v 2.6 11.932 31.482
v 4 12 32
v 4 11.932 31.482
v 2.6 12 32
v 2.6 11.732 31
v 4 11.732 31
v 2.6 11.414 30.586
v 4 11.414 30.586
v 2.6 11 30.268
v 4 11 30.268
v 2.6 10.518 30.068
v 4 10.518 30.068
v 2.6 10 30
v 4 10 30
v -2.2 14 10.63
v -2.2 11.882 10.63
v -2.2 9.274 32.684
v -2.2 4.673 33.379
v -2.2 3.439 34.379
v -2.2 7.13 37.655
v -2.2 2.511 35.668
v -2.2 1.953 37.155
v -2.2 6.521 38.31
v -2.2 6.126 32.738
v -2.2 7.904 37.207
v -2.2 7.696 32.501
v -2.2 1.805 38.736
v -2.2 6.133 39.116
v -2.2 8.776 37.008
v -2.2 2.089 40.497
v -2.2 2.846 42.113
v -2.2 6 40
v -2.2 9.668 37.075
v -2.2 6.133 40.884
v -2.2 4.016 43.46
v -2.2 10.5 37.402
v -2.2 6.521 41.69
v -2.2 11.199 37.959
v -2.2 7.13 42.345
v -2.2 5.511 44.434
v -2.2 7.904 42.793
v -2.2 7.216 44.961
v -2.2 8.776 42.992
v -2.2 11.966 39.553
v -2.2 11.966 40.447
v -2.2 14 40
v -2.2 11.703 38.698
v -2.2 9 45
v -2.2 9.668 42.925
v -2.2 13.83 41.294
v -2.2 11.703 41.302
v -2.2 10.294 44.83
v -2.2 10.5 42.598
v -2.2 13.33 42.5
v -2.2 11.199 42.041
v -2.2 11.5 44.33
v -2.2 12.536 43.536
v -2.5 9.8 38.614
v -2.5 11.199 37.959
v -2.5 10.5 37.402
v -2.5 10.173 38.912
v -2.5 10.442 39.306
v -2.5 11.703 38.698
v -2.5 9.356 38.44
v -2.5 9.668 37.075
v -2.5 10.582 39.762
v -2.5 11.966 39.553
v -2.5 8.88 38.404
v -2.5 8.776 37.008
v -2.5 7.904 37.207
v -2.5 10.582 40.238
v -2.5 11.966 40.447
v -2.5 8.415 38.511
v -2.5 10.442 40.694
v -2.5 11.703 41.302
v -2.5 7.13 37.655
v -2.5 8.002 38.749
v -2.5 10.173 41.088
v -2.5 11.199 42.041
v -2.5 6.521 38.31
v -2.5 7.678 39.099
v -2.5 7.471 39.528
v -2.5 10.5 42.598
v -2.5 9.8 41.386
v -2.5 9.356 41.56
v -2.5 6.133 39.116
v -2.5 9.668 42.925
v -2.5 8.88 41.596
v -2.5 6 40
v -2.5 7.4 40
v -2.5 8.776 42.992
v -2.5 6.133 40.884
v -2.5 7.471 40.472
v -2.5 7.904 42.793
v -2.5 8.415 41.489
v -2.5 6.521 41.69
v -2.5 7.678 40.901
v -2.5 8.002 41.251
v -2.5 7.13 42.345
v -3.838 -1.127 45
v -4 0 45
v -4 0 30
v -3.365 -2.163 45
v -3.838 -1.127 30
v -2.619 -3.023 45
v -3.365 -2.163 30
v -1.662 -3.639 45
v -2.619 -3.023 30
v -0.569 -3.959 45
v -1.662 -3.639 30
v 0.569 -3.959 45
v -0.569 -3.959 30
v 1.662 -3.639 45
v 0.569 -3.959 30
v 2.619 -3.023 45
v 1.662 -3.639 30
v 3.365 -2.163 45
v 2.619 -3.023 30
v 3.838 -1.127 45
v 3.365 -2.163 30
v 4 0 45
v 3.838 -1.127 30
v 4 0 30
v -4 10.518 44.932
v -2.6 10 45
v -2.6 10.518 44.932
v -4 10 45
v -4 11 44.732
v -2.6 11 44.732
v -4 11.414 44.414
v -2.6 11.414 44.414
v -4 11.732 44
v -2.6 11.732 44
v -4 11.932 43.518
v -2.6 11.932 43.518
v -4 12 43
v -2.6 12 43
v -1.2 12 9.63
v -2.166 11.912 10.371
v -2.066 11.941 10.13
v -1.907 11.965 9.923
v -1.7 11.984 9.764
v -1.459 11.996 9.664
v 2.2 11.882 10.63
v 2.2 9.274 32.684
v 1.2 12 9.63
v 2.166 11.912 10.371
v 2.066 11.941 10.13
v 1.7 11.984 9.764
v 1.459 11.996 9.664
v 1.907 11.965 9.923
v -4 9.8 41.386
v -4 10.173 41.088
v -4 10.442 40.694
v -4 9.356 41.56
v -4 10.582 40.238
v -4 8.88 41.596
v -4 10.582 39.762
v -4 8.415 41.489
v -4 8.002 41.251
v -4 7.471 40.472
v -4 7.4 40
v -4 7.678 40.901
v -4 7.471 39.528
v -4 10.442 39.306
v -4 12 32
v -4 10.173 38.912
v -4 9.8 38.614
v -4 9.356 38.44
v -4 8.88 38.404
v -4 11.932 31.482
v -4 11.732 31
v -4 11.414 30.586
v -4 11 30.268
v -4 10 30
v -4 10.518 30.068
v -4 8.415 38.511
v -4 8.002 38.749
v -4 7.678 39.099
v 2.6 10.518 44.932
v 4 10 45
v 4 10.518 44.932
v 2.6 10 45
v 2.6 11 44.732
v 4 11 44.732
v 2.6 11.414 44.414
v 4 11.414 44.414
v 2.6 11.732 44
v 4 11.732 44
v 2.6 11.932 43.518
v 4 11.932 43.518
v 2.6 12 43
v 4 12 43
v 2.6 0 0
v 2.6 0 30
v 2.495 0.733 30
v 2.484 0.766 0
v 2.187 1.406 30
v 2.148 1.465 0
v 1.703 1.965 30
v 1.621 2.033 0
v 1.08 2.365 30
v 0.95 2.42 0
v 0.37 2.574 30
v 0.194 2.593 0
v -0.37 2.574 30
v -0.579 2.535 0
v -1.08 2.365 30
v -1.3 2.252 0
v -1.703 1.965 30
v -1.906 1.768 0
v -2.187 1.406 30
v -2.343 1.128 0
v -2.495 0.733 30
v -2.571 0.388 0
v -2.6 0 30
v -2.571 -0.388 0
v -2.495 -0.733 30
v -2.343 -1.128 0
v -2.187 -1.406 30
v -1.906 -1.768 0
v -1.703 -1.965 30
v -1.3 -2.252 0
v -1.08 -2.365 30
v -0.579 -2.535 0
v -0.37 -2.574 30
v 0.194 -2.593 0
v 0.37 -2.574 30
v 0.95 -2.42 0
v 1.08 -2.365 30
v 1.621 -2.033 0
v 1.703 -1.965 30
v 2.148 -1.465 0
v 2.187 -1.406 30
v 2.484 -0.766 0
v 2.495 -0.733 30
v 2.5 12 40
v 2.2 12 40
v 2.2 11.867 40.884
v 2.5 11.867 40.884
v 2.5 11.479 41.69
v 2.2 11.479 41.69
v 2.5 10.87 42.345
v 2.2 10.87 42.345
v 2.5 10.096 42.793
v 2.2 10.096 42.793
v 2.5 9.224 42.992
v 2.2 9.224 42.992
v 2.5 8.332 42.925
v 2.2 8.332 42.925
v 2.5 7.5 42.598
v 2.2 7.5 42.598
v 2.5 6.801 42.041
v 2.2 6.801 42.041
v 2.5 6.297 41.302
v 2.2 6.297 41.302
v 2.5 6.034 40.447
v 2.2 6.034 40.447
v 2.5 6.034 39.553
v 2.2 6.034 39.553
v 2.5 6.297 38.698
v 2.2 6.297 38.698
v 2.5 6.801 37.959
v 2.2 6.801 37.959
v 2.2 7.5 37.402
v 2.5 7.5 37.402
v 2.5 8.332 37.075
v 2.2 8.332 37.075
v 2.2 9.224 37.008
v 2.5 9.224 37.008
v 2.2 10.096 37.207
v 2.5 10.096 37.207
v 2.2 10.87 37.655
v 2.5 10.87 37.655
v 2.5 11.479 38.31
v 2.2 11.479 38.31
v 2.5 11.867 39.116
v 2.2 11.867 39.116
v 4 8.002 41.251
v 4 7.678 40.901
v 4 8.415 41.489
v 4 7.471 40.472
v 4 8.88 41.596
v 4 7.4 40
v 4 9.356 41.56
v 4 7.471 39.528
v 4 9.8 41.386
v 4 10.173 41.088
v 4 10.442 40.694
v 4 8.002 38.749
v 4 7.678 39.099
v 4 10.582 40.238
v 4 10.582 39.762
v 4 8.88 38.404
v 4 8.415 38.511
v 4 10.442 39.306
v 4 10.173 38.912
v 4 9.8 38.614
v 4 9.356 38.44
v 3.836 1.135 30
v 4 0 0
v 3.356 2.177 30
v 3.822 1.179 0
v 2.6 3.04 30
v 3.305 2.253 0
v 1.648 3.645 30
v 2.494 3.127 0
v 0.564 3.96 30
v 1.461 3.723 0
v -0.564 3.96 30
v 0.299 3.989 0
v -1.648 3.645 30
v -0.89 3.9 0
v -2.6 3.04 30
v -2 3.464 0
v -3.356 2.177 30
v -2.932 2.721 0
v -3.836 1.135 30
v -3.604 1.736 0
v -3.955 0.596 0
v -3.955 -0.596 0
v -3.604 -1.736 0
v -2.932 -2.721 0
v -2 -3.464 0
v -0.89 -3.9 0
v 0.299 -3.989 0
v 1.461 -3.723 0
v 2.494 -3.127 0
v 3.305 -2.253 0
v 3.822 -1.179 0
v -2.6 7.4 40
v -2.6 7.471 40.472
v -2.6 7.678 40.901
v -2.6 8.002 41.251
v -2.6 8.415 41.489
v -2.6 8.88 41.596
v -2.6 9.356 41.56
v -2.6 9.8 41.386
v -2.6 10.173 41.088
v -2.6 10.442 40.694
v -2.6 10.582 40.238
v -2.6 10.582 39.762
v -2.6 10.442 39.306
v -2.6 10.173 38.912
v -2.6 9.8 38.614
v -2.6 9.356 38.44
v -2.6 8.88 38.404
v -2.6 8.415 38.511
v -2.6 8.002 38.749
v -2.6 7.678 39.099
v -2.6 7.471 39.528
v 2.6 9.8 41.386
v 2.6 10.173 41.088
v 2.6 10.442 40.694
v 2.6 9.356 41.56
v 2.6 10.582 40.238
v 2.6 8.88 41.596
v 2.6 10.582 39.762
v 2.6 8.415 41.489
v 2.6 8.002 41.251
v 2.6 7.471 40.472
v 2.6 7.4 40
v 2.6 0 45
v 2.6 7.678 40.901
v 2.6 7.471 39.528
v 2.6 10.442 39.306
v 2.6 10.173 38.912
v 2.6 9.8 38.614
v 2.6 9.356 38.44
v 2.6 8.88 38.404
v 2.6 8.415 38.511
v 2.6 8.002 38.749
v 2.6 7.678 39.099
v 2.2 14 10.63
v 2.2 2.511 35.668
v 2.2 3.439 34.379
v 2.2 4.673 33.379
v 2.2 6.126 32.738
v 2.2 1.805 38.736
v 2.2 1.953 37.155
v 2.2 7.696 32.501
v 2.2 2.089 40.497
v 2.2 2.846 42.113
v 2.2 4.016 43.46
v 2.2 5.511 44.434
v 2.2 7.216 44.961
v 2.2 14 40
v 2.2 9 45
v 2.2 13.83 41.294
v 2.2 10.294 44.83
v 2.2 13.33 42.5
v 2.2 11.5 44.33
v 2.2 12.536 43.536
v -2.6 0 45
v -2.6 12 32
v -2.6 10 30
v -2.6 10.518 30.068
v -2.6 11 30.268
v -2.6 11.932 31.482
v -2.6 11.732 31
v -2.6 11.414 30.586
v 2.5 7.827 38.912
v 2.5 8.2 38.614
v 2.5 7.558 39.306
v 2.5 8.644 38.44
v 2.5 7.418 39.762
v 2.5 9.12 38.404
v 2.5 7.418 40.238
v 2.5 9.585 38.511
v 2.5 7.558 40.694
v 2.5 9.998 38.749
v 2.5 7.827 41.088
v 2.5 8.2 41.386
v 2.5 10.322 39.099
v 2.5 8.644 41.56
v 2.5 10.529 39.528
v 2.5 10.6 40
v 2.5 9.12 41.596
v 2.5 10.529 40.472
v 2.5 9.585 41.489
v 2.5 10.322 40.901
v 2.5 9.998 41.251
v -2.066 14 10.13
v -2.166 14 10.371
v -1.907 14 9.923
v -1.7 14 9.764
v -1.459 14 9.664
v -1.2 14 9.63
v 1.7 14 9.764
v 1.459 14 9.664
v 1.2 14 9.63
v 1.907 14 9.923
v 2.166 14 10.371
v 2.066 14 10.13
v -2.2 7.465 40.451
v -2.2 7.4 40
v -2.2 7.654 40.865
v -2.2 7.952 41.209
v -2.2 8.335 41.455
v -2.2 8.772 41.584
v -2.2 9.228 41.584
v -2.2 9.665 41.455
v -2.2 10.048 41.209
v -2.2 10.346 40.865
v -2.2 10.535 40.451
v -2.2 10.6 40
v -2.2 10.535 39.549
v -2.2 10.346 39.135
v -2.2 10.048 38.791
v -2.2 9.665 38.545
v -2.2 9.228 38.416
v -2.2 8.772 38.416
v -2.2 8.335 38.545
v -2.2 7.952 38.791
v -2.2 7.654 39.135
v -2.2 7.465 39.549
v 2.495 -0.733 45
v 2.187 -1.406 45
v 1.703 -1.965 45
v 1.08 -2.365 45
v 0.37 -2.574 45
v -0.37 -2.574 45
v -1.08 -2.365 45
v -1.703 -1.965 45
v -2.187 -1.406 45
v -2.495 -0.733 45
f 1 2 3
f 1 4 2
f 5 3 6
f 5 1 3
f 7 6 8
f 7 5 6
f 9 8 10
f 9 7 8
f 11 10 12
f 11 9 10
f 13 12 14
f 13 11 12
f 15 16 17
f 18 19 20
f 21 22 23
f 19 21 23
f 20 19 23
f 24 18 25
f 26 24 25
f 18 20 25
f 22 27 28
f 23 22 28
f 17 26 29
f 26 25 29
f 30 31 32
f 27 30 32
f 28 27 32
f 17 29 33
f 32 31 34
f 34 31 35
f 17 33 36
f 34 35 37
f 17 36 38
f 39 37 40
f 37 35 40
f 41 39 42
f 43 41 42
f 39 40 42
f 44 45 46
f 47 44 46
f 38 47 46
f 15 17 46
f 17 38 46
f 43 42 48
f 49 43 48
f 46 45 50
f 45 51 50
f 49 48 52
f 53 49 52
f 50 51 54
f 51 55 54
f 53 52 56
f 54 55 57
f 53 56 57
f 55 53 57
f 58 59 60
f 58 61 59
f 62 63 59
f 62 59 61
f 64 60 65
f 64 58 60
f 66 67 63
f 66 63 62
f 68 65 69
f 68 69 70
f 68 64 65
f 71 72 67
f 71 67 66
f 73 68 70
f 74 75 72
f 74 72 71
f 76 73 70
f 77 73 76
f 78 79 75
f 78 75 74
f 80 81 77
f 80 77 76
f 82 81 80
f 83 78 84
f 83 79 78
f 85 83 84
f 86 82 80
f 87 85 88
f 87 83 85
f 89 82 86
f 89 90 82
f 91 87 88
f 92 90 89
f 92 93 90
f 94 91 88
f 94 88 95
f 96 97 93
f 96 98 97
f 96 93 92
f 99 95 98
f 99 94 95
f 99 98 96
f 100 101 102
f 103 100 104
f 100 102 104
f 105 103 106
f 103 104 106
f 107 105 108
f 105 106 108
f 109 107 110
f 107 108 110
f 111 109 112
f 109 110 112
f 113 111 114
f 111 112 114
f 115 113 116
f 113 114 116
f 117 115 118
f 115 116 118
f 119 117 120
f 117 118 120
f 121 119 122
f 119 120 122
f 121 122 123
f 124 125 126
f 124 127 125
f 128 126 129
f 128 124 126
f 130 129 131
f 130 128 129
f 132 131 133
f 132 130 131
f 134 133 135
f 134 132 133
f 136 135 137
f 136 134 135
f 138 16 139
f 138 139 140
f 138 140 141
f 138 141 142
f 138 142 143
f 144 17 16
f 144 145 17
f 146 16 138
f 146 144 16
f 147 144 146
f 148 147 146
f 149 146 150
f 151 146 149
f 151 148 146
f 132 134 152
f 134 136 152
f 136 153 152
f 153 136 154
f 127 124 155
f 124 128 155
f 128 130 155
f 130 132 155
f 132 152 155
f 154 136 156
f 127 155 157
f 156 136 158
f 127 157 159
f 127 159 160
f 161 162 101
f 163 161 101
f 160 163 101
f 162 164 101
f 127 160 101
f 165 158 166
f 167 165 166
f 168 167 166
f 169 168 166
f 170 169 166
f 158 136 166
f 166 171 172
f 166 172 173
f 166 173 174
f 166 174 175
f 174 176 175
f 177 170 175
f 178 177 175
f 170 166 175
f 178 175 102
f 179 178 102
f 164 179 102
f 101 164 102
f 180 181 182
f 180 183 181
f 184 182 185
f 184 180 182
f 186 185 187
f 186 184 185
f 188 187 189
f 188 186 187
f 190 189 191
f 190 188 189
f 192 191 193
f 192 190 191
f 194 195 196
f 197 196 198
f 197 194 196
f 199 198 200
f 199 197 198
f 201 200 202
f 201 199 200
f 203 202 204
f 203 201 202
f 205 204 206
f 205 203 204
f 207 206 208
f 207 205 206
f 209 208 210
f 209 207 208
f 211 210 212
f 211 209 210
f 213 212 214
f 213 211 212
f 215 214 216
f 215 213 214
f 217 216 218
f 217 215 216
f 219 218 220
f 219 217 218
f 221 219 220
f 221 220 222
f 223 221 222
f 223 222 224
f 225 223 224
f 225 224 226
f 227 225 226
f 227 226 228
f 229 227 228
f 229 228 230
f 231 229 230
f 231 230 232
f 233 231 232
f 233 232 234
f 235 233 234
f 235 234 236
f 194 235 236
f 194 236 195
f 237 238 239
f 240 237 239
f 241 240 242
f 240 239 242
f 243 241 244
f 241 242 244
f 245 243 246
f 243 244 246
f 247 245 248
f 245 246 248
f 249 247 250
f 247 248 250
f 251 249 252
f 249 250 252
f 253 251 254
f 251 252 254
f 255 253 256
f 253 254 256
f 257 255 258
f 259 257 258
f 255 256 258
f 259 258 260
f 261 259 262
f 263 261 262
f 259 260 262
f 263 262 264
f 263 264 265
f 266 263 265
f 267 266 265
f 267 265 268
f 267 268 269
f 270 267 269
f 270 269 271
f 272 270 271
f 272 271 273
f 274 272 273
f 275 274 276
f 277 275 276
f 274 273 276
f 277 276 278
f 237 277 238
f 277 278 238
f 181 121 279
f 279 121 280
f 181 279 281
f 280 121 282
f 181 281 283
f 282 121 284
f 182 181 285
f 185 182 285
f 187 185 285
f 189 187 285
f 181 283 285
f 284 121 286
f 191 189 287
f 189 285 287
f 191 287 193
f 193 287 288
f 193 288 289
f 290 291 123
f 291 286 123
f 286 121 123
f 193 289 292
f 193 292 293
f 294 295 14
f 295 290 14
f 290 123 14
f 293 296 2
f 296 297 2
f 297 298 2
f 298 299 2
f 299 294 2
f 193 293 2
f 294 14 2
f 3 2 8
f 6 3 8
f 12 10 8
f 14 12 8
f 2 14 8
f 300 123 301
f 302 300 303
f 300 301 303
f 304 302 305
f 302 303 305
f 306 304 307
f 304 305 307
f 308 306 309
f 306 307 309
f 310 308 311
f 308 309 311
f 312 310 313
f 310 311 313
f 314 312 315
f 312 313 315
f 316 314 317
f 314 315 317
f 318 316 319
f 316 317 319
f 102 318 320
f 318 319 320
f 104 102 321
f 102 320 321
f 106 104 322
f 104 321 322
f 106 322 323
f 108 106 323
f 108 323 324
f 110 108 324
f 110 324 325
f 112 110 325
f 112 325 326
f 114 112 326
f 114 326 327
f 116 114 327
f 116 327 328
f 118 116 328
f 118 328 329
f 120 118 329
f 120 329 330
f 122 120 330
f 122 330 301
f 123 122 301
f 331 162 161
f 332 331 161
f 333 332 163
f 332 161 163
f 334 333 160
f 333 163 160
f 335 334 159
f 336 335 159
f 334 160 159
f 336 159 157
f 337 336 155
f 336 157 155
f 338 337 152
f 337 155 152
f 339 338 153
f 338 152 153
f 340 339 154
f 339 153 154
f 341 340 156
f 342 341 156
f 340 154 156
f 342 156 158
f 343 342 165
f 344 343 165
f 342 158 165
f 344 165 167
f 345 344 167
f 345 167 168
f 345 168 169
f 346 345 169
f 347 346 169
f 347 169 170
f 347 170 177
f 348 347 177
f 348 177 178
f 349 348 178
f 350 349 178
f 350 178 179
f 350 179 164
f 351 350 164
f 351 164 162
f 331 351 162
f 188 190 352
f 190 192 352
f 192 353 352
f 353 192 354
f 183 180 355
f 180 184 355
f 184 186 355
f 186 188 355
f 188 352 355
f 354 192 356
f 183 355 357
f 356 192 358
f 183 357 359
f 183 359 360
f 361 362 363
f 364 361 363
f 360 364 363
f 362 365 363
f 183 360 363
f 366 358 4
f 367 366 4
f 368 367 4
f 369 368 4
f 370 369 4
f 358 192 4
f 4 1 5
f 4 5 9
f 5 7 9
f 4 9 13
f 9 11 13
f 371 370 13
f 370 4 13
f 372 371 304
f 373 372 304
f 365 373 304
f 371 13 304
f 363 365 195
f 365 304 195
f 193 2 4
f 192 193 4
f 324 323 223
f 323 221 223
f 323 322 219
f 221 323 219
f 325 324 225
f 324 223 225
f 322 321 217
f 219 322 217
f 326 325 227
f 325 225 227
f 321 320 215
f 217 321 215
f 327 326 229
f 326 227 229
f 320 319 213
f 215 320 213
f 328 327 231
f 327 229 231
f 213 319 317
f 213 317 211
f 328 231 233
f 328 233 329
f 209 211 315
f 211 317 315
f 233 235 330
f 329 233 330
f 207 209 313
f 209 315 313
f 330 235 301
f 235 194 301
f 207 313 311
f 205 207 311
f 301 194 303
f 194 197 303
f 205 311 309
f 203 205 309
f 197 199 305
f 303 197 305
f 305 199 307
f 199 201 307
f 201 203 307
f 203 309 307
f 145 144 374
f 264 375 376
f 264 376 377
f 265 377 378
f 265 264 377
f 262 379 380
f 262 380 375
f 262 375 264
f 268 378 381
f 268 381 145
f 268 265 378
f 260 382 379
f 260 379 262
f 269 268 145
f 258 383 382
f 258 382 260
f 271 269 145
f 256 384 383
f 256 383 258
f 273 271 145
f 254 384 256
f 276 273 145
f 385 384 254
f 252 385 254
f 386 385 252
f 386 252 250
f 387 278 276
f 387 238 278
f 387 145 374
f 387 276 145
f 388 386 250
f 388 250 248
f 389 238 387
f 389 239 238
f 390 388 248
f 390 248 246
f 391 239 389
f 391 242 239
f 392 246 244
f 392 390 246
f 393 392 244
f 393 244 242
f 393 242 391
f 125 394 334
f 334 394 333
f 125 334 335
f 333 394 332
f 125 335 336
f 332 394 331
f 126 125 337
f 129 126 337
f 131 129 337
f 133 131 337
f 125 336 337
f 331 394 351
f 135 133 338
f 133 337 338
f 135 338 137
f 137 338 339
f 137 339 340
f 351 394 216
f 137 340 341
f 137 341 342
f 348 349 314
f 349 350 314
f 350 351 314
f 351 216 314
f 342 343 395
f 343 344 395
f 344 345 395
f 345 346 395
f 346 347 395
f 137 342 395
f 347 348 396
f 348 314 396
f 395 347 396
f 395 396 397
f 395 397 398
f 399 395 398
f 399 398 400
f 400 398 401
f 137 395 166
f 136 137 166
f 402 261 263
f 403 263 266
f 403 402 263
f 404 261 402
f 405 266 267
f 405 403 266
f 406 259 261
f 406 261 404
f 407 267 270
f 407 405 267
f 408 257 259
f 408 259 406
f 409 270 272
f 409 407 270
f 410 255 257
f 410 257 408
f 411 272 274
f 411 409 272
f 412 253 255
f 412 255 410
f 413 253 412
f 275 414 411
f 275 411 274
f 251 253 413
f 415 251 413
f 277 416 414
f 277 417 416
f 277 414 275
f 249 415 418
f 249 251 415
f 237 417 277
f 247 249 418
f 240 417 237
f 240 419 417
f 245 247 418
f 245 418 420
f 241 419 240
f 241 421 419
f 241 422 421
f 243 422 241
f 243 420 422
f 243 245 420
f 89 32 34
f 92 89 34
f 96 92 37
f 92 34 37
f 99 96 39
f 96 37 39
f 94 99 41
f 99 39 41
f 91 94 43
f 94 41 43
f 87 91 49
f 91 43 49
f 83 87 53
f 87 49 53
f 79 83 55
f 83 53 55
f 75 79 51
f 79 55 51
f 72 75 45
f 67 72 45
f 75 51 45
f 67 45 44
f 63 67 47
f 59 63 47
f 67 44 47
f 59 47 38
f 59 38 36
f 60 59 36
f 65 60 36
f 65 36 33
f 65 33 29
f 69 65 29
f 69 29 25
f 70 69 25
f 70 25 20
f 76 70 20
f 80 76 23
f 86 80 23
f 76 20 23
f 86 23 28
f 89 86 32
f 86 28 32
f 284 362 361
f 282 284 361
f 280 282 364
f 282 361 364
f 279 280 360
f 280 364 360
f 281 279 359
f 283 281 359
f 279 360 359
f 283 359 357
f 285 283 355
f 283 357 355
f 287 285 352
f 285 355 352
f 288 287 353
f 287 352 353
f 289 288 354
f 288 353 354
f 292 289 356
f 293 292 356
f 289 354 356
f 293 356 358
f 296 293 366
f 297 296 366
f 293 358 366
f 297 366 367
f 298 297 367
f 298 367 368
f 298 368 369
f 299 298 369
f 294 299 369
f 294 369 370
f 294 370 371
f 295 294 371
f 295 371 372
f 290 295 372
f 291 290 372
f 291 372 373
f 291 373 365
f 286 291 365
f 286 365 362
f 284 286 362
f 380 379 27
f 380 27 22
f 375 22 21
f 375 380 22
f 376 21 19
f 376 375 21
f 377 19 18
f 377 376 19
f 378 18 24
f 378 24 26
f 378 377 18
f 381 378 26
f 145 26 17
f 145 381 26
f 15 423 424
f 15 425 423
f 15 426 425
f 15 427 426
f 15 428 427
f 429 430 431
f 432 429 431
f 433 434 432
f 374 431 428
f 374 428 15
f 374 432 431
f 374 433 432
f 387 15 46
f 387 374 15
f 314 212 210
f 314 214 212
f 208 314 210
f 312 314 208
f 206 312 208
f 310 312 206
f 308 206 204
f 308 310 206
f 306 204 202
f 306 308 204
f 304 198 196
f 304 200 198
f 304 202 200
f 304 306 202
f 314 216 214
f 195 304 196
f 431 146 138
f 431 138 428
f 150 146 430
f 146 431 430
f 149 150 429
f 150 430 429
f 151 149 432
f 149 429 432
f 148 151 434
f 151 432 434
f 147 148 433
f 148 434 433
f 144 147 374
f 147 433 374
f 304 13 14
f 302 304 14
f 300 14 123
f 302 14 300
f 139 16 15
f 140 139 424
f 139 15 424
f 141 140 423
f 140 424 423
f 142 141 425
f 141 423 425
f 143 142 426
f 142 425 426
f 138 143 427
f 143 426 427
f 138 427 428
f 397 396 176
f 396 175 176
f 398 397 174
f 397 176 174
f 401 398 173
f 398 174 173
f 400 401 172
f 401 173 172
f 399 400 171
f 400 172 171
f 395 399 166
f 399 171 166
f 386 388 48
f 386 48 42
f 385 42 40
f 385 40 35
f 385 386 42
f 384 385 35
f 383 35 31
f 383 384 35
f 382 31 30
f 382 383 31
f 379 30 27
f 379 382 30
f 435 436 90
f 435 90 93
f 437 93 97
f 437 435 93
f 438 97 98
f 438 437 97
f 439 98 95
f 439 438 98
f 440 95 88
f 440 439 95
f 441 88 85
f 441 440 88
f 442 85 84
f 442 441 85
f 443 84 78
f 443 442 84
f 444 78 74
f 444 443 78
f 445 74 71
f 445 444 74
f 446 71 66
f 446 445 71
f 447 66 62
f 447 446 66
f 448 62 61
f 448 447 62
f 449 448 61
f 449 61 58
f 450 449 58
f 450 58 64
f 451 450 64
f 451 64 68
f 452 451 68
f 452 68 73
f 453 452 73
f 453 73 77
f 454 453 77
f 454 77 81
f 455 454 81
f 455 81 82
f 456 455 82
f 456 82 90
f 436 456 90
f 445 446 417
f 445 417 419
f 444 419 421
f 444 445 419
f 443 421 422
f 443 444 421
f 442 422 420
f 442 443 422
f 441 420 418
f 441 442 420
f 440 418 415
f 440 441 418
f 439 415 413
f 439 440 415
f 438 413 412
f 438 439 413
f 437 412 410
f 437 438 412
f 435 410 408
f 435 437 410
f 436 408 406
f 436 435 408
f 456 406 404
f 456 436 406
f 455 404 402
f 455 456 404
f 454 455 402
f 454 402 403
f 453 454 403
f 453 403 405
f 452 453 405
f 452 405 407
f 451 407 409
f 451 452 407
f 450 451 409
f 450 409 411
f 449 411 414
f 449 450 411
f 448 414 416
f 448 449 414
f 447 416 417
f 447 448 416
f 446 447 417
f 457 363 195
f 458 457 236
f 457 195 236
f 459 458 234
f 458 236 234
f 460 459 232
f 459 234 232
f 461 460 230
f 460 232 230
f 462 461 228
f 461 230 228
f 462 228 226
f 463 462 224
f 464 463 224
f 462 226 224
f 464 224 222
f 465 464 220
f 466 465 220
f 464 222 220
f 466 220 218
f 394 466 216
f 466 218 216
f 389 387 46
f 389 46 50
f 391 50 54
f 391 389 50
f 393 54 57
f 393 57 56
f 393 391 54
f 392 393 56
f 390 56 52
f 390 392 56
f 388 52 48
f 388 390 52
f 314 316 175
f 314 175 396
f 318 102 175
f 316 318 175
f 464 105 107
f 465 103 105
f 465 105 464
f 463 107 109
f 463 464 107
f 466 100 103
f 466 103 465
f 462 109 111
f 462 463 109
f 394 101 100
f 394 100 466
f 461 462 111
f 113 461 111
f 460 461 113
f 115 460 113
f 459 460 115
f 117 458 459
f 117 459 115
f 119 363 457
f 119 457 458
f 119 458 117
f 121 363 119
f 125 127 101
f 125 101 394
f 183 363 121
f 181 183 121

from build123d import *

# Parameters (mm, degrees)
F0_R      = 4
F0_R_2    = 2.6
F1_DEPTH  = 30
F3_DEPTH  = 15
F6_D      = 3.2
F7_R      = 1.6
F8_DEPTH  = 2.2
F9_R      = 3
F9_R_2    = 1.6
F10_DEPTH = 0.3
F11_R     = 3
F11_R_2   = 1.6
F12_DEPTH = 0.3
F13_R     = 2
F14_R     = 1


with BuildPart() as f1:
    # F0 (on Top) → F1 (new body)
    with BuildSketch(Plane.XY):
        Circle(F0_R)
        Circle(F0_R_2, mode=Mode.SUBTRACT)
    extrude(amount=F1_DEPTH)

    # F2 (on face) → F3 (join)
    with BuildSketch(Plane.XY.offset(30)):
        with BuildLine():
            ThreePointArc((2.6, 0), (0, -2.6), (-2.6, 0))
            Line((-2.6, 0), (-2.6, 3.0397368307))
            ThreePointArc((-2.6, 3.0397368307), (-3.6331804249, 1.6733200531), (-4, 0))
            ThreePointArc((-4, 0), (0, -4), (4, 0))
            ThreePointArc((4, 0), (3.6331804249, 1.6733200531), (2.6, 3.0397368307))
            Line((2.6, 3.0397368307), (2.6, 0))
        make_face()
        with BuildLine():
            Line((2.6, 12), (2.6, 3.0397368307))
            ThreePointArc((2.6, 3.0397368307), (3.6331804249, 1.6733200531), (4, 0))
            Line((4, 0), (4, 12))
            Line((4, 12), (2.6, 12))
        make_face()
        with BuildLine():
            ThreePointArc((-4, 0), (-3.6331804249, 1.6733200531), (-2.6, 3.0397368307))
            Line((-2.6, 3.0397368307), (-2.6, 12))
            Line((-2.6, 12), (-4, 12))
            Line((-4, 12), (-4, 0))
        make_face()
    extrude(amount=F3_DEPTH)

    # F6 (through all)
    with Locations(Plane.YZ.offset(4)):
        with Locations((9, 40)):
            Hole(F6_D / 2)

    # F13
    f13_edges = [f1.edges().sort_by_distance(p)[0] for p in [
        (-3.3, 12, 45),
        (3.3, 12, 45),
        (3.3, 12, 30),
        (-3.3, 12, 30),
    ]]
    fillet(f13_edges, radius=F13_R)


with BuildPart() as f8:
    # F7 (on Right) → F8 (new body, symmetric)
    with BuildSketch(Plane.YZ):
        with BuildLine():
            Line((14, 9.6299987846), (14, 40))
            ThreePointArc((14, 40), (12.5355339059, 36.4644660941), (9, 35))
            Line((9, 35), (9.2738851246, 32.6838446857))
            Line((9.2738851246, 32.6838446857), (12, 9.6299987846))
            Line((12, 9.6299987846), (14, 9.6299987846))
        make_face()
        with BuildLine():
            ThreePointArc((9, 35), (12.5355339059, 36.4644660941), (14, 40))
            ThreePointArc((14, 40), (12.5355339059, 43.5355339059), (9, 45))
            ThreePointArc((9, 45), (7.7492471095, 44.8410347248), (6.5780247299, 44.3742468827))
            ThreePointArc((6.5780247299, 44.3742468827), (4.1589652752, 38.7492471095), (9, 35))
        make_face()
        with Locations((9, 40)):
            Circle(F7_R, mode=Mode.SUBTRACT)
        with BuildLine():
            Line((9.2738851246, 32.6838446857), (9, 35))
            ThreePointArc((9, 35), (4.1589652752, 38.7492471095), (6.5780247299, 44.3742468827))
            ThreePointArc((6.5780247299, 44.3742468827), (3.2206469097, 42.3767931689), (1.804635862, 38.7358152947))
            ThreePointArc((1.804635862, 38.7358152947), (4.0227615669, 33.8381902849), (9.2738851246, 32.6838446857))
        make_face()
        with BuildLine():
            ThreePointArc((6.5780247299, 44.3742468827), (7.7492471095, 44.8410347248), (9, 45))
            ThreePointArc((9, 45), (4.016275588, 43.4599870381), (1.804635862, 38.7358152947))
            ThreePointArc((1.804635862, 38.7358152947), (3.2206469097, 42.3767931689), (6.5780247299, 44.3742468827))
        make_face()
    extrude(amount=F8_DEPTH, both=True)

    # F9 (on face) → F10 (join)
    with BuildSketch(Plane.YZ.offset(2.2)):
        with Locations((9, 40)):
            Circle(F9_R)
        with Locations((9, 40)):
            Circle(F9_R_2, mode=Mode.SUBTRACT)
    extrude(amount=F10_DEPTH)

    # F11 (on face) → F12 (join)
    with BuildSketch(Plane(origin=(-2.2, 0, 0), x_dir=(0, -1, 0), z_dir=(-1, 0, 0))):
        with Locations((-9, 40)):
            Circle(F11_R)
        with Locations((-9, 40)):
            Circle(F11_R_2, mode=Mode.SUBTRACT)
    extrude(amount=F12_DEPTH)

    # F14
    f14_edges = [f8.edges().sort_by_distance(p)[0] for p in [
        (-2.2, 13, 9.629999),
        (2.2, 13, 9.629999),
    ]]
    fillet(f14_edges, radius=F14_R)


solid = Compound([f1.part, f8.part])
